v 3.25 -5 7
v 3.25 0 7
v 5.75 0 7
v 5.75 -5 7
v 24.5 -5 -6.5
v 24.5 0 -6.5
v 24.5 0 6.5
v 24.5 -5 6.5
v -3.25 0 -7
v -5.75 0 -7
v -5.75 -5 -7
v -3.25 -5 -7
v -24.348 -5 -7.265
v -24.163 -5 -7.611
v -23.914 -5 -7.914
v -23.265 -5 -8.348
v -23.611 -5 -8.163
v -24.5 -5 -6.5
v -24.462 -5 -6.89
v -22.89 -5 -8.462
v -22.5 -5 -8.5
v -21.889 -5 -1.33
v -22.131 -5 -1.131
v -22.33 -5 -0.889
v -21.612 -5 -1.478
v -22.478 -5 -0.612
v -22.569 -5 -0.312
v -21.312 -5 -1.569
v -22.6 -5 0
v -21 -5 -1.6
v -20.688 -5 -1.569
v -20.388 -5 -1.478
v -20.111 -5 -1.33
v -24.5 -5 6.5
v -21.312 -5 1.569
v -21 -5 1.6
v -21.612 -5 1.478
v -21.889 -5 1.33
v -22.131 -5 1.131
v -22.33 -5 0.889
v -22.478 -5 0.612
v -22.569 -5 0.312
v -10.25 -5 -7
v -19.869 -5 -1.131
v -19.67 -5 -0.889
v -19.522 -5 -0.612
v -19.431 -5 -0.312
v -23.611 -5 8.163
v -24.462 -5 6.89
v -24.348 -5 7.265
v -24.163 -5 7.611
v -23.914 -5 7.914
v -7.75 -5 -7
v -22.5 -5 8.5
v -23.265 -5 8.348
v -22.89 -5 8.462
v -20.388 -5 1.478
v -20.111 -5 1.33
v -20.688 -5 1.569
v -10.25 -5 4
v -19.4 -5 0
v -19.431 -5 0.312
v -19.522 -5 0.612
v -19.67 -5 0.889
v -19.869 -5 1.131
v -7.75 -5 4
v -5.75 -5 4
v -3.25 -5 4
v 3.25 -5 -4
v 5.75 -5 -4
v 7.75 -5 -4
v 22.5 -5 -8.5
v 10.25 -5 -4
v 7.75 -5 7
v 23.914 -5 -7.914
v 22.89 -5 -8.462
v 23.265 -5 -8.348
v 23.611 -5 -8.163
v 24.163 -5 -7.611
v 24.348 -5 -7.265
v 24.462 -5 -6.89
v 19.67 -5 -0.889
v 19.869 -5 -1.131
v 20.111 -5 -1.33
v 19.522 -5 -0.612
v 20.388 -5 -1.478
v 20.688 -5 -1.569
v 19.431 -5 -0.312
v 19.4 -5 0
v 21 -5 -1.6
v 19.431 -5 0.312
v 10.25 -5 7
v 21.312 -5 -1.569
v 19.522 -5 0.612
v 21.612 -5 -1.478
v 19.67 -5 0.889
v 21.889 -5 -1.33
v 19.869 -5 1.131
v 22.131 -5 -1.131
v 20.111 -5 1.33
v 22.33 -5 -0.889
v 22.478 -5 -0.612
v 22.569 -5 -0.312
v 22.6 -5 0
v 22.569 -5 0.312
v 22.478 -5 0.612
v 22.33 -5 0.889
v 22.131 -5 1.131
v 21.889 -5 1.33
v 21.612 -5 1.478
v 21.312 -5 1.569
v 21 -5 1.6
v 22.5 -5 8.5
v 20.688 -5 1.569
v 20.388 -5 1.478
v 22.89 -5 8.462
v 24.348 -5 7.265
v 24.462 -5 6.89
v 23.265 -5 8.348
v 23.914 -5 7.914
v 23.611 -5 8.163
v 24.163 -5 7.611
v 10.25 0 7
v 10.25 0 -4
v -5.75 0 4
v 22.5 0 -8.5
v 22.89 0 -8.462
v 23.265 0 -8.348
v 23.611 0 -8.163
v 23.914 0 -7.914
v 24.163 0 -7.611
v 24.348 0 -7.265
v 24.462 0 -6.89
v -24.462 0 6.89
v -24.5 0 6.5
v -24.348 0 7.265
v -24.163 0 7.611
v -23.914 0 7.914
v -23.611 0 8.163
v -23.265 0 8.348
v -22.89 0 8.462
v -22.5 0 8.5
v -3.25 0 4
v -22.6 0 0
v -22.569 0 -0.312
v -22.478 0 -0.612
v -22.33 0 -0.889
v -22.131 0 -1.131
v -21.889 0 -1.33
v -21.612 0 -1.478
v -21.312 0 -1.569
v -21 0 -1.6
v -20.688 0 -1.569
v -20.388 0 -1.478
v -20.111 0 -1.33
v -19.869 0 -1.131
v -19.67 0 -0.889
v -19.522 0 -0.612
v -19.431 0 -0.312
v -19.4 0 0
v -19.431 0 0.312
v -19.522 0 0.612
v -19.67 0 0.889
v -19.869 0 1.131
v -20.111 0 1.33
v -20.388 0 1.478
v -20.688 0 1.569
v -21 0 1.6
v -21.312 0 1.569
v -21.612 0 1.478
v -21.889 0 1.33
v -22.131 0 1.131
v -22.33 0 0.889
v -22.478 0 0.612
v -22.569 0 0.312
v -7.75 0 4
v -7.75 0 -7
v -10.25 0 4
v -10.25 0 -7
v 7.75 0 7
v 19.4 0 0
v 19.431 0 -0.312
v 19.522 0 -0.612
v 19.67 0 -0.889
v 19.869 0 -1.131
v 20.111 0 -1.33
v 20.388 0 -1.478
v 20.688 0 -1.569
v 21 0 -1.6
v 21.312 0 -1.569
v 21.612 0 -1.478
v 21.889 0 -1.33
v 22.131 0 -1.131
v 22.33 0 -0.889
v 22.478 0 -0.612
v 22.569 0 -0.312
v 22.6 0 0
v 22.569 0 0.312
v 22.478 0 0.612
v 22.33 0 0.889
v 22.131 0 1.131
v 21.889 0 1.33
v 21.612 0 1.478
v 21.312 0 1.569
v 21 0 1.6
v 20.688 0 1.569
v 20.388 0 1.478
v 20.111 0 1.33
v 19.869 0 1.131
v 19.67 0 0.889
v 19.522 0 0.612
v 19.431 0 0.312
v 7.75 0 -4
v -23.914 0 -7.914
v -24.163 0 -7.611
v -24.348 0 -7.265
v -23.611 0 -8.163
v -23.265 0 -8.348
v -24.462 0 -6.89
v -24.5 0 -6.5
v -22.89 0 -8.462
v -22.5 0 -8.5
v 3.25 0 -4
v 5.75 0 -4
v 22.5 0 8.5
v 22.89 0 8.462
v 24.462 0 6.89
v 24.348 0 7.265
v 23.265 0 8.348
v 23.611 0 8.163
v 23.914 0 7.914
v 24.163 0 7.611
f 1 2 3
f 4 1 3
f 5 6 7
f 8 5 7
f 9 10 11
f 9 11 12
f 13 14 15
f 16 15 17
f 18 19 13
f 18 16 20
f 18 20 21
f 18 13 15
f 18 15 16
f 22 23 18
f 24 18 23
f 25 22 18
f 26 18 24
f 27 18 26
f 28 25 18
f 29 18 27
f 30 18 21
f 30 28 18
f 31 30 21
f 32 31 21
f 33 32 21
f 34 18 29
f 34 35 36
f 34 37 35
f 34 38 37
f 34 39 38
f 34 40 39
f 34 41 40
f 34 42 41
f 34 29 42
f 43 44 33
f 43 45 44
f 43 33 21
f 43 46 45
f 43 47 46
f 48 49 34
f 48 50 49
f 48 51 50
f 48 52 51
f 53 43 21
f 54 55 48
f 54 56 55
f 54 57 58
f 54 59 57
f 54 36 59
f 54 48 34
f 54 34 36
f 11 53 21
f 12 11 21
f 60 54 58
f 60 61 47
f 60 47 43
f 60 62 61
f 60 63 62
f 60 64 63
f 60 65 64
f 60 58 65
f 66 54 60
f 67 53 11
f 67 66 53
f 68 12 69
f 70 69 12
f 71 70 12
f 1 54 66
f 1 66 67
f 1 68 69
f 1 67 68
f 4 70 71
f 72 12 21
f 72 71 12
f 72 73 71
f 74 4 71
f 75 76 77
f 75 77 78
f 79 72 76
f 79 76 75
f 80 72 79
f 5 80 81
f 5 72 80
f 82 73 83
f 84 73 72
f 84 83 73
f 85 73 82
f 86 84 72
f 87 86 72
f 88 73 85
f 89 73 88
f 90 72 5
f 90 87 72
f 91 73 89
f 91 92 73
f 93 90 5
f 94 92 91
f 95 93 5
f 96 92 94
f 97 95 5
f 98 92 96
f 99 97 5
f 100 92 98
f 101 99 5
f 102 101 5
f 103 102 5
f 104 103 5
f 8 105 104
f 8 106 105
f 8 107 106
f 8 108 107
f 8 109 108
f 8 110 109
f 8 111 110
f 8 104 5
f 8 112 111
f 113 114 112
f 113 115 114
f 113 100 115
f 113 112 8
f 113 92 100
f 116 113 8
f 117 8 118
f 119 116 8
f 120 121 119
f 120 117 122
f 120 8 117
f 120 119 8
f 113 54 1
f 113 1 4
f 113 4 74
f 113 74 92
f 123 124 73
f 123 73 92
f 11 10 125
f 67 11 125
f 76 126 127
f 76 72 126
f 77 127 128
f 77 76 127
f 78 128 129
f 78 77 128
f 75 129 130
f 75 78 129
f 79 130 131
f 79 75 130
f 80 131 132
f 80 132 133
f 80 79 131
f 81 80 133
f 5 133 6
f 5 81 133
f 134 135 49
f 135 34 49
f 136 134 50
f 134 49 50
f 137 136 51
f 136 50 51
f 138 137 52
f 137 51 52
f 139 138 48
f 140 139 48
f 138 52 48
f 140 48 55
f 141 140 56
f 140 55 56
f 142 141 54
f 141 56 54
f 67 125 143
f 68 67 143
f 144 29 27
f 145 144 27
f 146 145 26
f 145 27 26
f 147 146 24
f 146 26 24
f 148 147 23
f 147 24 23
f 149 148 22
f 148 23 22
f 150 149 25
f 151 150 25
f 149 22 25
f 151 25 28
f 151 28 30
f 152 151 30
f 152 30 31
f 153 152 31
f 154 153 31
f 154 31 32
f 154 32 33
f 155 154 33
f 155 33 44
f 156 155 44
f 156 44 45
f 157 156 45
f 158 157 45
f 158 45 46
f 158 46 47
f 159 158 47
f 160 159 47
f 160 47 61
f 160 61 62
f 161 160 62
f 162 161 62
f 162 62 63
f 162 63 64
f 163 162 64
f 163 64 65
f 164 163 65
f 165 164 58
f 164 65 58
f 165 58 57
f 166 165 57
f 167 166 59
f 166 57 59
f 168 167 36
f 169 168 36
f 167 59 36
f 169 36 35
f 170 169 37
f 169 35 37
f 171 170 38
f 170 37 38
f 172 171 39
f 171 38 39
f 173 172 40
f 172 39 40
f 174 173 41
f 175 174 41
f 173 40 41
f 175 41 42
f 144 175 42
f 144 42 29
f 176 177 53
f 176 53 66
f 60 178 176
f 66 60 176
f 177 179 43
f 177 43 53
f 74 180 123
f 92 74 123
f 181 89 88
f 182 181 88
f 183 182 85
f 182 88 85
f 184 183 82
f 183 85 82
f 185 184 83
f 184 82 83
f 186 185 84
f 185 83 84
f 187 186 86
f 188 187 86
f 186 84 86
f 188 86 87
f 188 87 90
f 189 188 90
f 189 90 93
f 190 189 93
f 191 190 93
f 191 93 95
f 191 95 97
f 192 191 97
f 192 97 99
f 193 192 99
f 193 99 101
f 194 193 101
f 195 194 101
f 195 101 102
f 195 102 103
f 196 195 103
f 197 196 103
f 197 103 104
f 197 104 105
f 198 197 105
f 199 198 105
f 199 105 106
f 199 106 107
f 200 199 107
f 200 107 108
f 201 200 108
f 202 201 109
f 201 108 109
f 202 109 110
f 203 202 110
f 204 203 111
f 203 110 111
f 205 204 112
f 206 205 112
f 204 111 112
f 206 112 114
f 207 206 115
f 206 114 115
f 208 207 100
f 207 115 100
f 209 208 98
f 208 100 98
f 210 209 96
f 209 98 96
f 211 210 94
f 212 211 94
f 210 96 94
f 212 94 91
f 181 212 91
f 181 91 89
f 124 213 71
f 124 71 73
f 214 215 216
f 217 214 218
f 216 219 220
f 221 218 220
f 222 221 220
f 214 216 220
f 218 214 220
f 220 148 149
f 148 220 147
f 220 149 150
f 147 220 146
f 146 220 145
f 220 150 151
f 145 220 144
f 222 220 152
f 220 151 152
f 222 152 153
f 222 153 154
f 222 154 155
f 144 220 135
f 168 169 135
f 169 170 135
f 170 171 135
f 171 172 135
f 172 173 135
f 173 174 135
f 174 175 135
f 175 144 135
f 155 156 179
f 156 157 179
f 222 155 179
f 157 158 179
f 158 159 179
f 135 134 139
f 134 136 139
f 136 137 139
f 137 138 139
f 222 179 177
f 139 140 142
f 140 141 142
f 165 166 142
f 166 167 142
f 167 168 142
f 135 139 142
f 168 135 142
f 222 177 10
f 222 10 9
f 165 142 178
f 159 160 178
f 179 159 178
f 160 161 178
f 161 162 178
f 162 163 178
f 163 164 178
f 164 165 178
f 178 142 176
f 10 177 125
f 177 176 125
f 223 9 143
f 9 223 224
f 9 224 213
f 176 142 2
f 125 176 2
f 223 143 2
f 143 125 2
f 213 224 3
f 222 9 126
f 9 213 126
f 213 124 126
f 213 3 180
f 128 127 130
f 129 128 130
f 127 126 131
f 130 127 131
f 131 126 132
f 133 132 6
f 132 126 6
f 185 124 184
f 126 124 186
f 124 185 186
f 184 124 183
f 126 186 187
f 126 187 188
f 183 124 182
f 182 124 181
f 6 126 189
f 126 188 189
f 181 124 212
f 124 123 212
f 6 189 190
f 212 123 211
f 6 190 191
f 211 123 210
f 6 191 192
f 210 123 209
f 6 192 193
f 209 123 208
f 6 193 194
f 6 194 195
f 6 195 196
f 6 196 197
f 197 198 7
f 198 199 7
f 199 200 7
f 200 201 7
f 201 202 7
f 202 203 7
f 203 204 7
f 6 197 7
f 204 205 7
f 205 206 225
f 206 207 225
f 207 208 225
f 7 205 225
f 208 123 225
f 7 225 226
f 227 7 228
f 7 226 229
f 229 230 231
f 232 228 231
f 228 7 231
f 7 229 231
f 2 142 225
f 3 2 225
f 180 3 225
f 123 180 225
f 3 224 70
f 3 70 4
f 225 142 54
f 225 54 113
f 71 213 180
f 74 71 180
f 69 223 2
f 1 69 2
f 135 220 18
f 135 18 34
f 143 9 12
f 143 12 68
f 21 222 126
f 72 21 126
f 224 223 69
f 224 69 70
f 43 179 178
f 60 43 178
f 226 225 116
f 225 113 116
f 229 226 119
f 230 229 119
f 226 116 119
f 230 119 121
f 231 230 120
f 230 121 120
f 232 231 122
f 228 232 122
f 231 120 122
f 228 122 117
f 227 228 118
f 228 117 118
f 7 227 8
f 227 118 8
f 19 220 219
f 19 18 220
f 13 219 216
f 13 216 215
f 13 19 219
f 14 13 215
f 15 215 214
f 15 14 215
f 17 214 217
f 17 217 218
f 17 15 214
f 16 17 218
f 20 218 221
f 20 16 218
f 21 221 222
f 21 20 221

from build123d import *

# Parameters (mm, degrees)
F0_W     = 49
F0_H     = 17
F0_W_2   = 2.5
F0_H_2   = 11
F1_DEPTH = 5
F3_D     = 3.2
F4_R     = 2


with BuildPart() as f1:
    # F0 (on Front) → F1 (new body)
    with BuildSketch(Plane.XZ):
        Rectangle(F0_W, F0_H)
        with Locations((-9, -1.5)):
            Rectangle(F0_W_2, F0_H_2, mode=Mode.SUBTRACT)
        with Locations((-4.5, -1.5)):
            Rectangle(F0_W_2, F0_H_2, mode=Mode.SUBTRACT)
        with Locations((4.5, 1.5)):
            Rectangle(F0_W_2, F0_H_2, mode=Mode.SUBTRACT)
        with Locations((9, 1.5)):
            Rectangle(F0_W_2, F0_H_2, mode=Mode.SUBTRACT)
    extrude(amount=F1_DEPTH)

    # F3 (through all)
    with Locations(Plane(origin=(0, 0, 0), x_dir=(1, 0, 0), z_dir=(0, 1, 0))):
        with Locations((-21, 0), (21, 0)):
            Hole(F3_D / 2)

    # F4
    f4_edges = [f1.edges().sort_by_distance(p)[0] for p in [
        (-24.5, -2.5, 8.5),
        (-24.5, -2.5, -8.5),
        (24.5, -2.5, 8.5),
        (24.5, -2.5, -8.5),
    ]]
    fillet(f4_edges, radius=F4_R)


solid = f1.part
